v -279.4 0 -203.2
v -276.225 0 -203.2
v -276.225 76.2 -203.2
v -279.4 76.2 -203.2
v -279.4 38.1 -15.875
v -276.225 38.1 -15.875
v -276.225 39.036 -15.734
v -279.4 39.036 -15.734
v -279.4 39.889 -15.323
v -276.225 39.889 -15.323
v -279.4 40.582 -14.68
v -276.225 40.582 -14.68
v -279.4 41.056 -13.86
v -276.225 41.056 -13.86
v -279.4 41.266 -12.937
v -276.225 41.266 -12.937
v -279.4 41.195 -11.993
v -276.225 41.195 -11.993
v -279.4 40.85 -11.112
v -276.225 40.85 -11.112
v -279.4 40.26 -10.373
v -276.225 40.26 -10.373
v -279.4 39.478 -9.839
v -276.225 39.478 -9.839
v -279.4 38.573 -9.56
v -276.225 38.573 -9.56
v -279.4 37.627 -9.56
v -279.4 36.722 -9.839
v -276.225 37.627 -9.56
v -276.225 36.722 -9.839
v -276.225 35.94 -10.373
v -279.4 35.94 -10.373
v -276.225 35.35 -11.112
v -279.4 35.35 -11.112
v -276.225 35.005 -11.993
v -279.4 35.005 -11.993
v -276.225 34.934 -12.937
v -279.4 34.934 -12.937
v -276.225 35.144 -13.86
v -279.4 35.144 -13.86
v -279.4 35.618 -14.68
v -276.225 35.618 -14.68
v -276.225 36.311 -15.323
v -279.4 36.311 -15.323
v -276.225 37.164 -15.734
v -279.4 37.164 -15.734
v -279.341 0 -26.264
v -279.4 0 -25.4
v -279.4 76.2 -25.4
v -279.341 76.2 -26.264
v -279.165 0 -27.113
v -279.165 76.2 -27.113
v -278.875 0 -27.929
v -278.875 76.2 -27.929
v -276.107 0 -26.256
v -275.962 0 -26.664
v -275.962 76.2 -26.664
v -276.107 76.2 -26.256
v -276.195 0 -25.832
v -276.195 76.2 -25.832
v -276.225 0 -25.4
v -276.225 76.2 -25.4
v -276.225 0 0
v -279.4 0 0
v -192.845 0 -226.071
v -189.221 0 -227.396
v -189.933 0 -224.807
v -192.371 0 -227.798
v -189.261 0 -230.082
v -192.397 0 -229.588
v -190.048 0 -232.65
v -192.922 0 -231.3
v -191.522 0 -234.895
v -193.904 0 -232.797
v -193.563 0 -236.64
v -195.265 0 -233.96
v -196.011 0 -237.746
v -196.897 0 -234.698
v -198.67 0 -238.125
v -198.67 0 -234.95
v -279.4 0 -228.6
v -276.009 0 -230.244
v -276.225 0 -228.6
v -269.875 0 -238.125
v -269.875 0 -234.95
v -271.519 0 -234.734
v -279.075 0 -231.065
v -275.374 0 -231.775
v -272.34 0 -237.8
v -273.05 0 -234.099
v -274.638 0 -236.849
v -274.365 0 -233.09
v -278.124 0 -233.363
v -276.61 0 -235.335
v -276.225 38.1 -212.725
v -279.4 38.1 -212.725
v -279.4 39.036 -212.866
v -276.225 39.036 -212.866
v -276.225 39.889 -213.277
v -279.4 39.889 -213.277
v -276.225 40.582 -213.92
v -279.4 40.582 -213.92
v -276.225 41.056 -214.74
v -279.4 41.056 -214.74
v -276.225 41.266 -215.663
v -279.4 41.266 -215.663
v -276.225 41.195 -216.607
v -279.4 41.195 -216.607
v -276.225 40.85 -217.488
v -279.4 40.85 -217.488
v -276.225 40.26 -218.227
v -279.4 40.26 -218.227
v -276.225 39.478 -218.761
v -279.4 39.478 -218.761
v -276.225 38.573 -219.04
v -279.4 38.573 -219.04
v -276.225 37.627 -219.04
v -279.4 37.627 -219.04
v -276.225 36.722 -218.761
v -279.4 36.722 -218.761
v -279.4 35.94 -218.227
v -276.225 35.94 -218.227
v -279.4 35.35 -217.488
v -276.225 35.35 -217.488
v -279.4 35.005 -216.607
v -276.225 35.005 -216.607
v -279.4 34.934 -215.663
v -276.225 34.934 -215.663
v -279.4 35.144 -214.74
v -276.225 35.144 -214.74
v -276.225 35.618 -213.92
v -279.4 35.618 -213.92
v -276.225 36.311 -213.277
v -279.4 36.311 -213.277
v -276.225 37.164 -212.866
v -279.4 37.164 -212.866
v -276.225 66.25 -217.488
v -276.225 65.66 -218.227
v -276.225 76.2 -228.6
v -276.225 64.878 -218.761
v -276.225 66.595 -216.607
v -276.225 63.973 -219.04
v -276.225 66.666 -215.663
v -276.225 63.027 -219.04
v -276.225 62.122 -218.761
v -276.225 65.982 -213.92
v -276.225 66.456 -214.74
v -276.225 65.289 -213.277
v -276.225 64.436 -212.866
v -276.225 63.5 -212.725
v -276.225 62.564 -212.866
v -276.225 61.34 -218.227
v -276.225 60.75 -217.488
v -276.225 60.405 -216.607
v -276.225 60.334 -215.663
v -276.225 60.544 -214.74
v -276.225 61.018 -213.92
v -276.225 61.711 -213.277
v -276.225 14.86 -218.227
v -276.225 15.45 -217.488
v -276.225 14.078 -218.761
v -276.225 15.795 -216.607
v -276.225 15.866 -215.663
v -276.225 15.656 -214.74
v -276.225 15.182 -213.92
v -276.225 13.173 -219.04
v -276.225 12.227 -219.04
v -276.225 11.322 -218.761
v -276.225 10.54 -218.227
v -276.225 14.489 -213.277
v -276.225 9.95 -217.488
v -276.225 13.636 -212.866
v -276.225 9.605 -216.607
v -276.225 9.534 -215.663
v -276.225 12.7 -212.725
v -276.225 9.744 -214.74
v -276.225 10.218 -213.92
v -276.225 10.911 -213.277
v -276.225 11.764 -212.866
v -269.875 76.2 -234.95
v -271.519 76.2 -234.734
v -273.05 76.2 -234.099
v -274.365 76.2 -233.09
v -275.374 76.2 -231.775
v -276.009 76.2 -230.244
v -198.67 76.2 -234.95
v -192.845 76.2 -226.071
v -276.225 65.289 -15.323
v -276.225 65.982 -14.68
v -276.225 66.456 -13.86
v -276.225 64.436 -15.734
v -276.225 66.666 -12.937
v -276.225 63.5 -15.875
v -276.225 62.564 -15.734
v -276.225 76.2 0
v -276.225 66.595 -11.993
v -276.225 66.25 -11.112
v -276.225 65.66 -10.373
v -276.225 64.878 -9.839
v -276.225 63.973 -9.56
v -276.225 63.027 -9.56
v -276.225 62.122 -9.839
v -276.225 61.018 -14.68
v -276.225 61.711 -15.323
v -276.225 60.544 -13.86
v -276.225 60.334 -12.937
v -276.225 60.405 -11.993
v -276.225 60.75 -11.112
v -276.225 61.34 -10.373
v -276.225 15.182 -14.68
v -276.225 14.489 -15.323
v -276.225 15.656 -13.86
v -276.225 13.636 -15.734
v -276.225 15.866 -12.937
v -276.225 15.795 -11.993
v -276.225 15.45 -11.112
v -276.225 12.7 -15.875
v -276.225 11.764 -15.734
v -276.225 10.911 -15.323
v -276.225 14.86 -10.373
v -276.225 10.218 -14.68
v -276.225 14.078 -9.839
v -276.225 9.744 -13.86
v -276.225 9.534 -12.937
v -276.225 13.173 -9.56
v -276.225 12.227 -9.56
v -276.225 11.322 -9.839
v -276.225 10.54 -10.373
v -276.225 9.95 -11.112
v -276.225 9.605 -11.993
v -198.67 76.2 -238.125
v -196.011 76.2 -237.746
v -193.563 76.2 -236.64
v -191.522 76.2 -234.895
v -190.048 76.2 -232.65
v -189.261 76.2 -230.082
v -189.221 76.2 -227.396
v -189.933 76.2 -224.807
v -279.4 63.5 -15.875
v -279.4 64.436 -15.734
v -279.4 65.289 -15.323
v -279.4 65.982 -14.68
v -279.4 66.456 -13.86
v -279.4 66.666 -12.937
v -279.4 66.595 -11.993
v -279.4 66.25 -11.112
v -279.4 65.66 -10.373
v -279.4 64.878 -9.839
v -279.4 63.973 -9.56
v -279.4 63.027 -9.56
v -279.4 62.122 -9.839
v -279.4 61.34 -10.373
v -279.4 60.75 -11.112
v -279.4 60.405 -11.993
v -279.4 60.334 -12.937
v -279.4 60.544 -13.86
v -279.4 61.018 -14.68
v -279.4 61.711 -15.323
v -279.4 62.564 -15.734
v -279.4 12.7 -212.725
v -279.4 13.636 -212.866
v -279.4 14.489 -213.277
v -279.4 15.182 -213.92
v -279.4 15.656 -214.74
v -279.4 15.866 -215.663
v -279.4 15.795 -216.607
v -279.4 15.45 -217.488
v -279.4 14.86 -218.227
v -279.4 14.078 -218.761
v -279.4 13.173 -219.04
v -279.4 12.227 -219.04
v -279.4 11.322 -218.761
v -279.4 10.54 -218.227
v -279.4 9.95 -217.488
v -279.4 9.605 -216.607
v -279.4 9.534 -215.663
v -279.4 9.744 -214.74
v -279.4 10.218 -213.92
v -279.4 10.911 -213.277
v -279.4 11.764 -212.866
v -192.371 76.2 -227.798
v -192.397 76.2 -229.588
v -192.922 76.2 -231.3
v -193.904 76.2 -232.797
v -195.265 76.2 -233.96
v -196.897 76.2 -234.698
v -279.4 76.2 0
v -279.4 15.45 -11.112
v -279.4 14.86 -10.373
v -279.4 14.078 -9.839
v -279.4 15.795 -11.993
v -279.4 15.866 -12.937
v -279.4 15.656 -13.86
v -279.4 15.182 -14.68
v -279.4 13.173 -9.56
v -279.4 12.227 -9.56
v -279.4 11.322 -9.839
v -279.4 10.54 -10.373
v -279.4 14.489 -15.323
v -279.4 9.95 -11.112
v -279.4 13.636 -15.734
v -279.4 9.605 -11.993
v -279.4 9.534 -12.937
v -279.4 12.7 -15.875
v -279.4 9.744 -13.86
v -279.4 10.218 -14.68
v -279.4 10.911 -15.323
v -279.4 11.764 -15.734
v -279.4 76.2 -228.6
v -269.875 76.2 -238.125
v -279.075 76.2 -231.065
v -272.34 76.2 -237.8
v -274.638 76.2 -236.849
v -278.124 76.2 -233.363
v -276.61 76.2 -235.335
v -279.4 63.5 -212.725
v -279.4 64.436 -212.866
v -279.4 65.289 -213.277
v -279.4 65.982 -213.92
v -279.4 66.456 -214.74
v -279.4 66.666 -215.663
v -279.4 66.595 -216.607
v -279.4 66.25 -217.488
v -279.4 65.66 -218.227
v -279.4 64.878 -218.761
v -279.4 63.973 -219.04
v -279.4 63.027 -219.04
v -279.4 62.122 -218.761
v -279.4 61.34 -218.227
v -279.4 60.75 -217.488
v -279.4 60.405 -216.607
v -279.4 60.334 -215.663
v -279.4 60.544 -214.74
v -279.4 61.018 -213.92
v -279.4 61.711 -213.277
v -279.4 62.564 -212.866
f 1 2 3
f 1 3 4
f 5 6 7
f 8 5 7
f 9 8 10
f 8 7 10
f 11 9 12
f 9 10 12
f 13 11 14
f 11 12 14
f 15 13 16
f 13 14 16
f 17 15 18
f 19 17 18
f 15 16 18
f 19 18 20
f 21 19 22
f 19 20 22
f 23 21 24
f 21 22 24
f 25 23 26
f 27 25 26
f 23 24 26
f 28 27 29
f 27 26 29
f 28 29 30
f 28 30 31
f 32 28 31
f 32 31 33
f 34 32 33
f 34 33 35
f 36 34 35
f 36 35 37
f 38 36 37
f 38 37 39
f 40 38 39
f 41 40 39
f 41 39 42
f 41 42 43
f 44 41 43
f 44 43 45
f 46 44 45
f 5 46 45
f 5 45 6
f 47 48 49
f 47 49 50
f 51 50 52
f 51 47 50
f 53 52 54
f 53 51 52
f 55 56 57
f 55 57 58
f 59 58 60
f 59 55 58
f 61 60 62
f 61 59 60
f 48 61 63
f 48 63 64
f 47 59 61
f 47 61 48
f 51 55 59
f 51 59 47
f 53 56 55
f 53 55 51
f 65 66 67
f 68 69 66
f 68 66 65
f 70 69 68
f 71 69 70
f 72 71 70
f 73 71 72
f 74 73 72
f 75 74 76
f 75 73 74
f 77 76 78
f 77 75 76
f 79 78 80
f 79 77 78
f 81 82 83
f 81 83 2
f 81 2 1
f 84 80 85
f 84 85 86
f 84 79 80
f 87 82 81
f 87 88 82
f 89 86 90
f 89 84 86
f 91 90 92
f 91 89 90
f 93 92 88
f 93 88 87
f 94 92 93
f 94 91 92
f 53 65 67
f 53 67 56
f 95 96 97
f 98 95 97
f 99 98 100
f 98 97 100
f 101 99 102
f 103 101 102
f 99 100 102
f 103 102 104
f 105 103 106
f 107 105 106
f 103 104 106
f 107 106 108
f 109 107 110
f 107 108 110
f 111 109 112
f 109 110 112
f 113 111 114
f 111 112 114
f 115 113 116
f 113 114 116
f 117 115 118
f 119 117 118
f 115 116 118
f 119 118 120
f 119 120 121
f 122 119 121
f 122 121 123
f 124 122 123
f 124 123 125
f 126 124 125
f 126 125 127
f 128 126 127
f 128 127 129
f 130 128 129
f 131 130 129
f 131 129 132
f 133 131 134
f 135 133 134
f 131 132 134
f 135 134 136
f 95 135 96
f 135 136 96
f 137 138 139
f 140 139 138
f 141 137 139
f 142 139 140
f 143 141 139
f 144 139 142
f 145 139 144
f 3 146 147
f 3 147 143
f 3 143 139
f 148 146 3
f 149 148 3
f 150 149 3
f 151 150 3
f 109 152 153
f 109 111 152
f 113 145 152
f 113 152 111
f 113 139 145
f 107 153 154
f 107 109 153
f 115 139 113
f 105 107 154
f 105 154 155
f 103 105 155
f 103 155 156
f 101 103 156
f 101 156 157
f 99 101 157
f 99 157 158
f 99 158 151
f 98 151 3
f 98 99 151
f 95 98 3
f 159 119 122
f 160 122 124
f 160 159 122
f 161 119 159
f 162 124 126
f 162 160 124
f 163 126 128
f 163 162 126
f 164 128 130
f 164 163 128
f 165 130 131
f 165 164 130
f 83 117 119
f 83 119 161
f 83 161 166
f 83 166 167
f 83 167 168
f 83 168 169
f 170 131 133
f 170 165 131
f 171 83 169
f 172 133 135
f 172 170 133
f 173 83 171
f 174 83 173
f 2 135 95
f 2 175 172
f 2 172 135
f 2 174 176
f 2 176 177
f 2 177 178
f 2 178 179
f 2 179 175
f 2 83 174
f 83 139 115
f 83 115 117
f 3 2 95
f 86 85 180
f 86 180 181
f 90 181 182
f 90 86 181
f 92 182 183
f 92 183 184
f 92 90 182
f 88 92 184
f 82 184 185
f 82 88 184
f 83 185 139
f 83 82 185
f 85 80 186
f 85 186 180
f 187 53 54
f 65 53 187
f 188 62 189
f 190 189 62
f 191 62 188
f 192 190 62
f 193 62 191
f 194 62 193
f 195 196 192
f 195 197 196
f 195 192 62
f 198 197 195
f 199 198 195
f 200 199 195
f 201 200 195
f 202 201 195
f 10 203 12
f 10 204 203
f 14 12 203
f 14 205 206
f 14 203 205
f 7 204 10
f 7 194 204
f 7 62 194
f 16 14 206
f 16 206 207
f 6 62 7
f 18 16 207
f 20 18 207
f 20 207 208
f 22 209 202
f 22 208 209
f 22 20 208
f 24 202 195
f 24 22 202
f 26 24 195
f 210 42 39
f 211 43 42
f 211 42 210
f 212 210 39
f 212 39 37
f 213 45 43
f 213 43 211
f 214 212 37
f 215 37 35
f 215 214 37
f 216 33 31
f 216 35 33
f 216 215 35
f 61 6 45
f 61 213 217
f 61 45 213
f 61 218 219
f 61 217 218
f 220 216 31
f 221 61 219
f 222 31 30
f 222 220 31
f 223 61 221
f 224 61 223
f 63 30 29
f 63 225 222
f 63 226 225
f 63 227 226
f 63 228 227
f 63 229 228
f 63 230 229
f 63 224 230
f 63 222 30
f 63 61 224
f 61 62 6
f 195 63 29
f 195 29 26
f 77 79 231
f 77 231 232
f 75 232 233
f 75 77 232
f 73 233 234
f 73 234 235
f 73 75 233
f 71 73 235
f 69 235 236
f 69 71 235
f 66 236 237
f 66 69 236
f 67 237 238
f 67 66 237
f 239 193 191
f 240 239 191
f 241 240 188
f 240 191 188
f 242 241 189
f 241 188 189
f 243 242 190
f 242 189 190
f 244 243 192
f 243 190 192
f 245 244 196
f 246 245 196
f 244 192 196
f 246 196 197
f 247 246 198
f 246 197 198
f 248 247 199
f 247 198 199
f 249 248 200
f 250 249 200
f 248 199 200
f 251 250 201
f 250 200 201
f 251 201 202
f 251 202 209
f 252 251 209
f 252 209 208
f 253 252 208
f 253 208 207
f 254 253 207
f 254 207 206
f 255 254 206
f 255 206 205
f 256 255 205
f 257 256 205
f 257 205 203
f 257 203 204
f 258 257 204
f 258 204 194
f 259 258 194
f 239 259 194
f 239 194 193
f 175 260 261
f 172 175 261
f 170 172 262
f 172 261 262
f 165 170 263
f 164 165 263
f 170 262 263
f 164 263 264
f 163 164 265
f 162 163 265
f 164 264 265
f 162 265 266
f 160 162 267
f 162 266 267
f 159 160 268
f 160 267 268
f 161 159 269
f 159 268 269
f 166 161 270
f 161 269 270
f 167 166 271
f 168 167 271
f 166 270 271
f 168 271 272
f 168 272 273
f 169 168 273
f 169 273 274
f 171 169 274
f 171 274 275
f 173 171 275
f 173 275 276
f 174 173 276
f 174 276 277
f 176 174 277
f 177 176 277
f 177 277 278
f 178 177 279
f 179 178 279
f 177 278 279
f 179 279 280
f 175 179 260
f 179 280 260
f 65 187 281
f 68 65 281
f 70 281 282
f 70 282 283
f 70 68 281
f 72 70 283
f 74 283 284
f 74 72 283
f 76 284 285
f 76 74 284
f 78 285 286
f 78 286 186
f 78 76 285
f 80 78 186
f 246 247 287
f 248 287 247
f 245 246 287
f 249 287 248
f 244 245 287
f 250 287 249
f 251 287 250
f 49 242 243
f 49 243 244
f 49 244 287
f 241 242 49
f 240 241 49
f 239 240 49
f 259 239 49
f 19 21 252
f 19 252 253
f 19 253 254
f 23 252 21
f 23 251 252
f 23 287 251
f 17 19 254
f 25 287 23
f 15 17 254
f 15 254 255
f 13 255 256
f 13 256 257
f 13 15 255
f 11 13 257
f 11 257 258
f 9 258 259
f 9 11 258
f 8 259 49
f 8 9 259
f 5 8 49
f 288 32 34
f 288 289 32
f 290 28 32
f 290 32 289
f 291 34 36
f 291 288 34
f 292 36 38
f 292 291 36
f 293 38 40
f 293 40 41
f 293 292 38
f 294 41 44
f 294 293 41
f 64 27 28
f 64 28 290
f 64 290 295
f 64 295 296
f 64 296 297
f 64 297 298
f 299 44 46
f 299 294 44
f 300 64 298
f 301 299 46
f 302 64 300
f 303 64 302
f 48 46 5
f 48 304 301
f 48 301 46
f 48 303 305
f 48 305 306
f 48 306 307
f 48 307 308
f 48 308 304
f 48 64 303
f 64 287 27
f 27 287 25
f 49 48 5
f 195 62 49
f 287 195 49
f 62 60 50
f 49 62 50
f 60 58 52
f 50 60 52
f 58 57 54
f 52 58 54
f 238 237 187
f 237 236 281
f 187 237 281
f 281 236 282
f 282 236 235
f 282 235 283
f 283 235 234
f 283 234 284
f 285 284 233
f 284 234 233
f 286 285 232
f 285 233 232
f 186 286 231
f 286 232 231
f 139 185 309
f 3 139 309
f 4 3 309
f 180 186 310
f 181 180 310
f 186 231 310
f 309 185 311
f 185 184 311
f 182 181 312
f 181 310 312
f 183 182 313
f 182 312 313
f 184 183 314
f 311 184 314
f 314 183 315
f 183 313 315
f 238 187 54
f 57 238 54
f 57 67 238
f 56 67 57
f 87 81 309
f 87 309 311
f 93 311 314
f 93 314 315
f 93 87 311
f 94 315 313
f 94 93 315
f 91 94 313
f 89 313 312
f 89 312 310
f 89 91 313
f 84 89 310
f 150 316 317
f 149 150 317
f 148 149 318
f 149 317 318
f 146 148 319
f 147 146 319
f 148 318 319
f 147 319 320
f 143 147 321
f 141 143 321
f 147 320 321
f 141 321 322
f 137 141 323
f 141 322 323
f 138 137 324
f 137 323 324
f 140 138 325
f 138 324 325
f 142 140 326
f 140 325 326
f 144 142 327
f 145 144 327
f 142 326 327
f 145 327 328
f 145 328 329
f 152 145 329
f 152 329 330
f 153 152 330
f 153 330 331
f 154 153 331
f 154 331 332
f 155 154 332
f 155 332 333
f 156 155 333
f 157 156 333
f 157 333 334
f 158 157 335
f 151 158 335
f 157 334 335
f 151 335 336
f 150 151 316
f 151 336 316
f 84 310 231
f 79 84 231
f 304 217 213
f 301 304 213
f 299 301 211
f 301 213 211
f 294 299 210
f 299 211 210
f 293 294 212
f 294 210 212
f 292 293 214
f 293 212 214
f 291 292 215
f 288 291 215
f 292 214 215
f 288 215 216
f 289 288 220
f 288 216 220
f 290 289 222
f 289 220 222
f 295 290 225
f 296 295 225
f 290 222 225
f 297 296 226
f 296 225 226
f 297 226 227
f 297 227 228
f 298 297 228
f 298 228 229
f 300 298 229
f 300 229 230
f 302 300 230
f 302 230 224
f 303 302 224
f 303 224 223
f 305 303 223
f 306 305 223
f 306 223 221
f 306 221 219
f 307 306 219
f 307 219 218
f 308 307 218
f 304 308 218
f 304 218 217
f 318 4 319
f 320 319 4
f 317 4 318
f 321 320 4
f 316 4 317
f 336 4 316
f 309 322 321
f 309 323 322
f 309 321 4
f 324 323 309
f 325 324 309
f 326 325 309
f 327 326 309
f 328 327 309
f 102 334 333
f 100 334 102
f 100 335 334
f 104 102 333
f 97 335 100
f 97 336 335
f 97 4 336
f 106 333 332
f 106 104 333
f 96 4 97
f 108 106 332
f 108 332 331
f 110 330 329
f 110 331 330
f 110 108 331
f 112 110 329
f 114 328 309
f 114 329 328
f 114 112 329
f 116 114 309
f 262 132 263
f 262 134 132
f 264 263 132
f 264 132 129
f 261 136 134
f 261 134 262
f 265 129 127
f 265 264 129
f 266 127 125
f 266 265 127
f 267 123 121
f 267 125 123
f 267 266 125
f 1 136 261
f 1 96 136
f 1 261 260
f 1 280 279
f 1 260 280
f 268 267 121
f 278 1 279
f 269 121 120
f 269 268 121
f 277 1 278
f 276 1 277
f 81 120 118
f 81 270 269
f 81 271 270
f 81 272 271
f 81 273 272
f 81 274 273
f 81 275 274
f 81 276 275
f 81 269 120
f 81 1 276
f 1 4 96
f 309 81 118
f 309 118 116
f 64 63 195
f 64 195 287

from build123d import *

# Parameters (mm, degrees)
BOSS_EXTRUDE1_DEPTH     = 76.2
SKETCH2_R               = 3.175
CUT_EXTRUDE1_DEPTH      = 88.080358512
CUT_EXTRUDE1_DEPTH_BACK = 4.175
SKETCH4_R               = 3.175
CUT_EXTRUDE3_DEPTH      = 3.175


with BuildPart() as part:
    # Sketch1 → Boss-Extrude1 (new body)
    with BuildSketch(Plane(origin=(0, 0, 0), x_dir=(1, 0, 0), z_dir=(0, 1, 0))):
        with BuildLine():
            Line((-279.4, 0), (-279.4, 25.4))
            ThreePointArc((-279.4, 25.4), (-279.267281416, 26.691476594), (-278.874673451, 27.928968009))
            Line((-278.874673451, 27.928968009), (-192.844968037, 226.071031991))
            ThreePointArc((-192.844968037, 226.071031991), (-193.36014778, 232.083069992), (-198.669641488, 234.95))
            Line((-198.669641488, 234.95), (-269.875, 234.95))
            ThreePointArc((-269.875, 234.95), (-274.365128061, 233.090128061), (-276.225, 228.6))
            Line((-276.225, 228.6), (-276.225, 203.2))
            Line((-276.225, 203.2), (-279.4, 203.2))
            Line((-279.4, 203.2), (-279.4, 228.6))
            ThreePointArc((-279.4, 228.6), (-276.610192091, 235.335192091), (-269.875, 238.125))
            Line((-269.875, 238.125), (-198.669641488, 238.125))
            ThreePointArc((-198.669641488, 238.125), (-190.705400927, 233.824604988), (-189.932631312, 224.806547986))
            Line((-189.932631312, 224.806547986), (-275.962336725, 26.664484005))
            ThreePointArc((-275.962336725, 26.664484005), (-276.158640708, 26.045738297), (-276.225, 25.4))
            Line((-276.225, 25.4), (-276.225, 0))
            Line((-276.225, 0), (-279.4, 0))
        make_face()
    extrude(amount=BOSS_EXTRUDE1_DEPTH)

    # Sketch2 → Cut-Extrude1 (cut, two sides)
    with BuildSketch(Plane(origin=(-276.225, 0, 0), x_dir=(0, 0, -1), z_dir=(1, 0, 0))) as cut_extrude1_sk:
        with Locations((12.7, 63.5)):
            Circle(SKETCH2_R)
        with Locations((12.7, 12.7)):
            Circle(SKETCH2_R)
        with Locations((12.7, 38.1)):
            Circle(SKETCH2_R)
    extrude(amount=CUT_EXTRUDE1_DEPTH, mode=Mode.SUBTRACT)
    extrude(cut_extrude1_sk.sketch, amount=-CUT_EXTRUDE1_DEPTH_BACK, mode=Mode.SUBTRACT)

    # Sketch4 → Cut-Extrude3 (cut)
    with BuildSketch(Plane.ZY.offset(279.4)):
        with Locations((-215.9, 38.1)):
            Circle(SKETCH4_R)
        with Locations((-215.9, 63.5)):
            Circle(SKETCH4_R)
        with Locations((-215.9, 12.7)):
            Circle(SKETCH4_R)
    extrude(amount=-CUT_EXTRUDE3_DEPTH, mode=Mode.SUBTRACT)


solid = part.part
